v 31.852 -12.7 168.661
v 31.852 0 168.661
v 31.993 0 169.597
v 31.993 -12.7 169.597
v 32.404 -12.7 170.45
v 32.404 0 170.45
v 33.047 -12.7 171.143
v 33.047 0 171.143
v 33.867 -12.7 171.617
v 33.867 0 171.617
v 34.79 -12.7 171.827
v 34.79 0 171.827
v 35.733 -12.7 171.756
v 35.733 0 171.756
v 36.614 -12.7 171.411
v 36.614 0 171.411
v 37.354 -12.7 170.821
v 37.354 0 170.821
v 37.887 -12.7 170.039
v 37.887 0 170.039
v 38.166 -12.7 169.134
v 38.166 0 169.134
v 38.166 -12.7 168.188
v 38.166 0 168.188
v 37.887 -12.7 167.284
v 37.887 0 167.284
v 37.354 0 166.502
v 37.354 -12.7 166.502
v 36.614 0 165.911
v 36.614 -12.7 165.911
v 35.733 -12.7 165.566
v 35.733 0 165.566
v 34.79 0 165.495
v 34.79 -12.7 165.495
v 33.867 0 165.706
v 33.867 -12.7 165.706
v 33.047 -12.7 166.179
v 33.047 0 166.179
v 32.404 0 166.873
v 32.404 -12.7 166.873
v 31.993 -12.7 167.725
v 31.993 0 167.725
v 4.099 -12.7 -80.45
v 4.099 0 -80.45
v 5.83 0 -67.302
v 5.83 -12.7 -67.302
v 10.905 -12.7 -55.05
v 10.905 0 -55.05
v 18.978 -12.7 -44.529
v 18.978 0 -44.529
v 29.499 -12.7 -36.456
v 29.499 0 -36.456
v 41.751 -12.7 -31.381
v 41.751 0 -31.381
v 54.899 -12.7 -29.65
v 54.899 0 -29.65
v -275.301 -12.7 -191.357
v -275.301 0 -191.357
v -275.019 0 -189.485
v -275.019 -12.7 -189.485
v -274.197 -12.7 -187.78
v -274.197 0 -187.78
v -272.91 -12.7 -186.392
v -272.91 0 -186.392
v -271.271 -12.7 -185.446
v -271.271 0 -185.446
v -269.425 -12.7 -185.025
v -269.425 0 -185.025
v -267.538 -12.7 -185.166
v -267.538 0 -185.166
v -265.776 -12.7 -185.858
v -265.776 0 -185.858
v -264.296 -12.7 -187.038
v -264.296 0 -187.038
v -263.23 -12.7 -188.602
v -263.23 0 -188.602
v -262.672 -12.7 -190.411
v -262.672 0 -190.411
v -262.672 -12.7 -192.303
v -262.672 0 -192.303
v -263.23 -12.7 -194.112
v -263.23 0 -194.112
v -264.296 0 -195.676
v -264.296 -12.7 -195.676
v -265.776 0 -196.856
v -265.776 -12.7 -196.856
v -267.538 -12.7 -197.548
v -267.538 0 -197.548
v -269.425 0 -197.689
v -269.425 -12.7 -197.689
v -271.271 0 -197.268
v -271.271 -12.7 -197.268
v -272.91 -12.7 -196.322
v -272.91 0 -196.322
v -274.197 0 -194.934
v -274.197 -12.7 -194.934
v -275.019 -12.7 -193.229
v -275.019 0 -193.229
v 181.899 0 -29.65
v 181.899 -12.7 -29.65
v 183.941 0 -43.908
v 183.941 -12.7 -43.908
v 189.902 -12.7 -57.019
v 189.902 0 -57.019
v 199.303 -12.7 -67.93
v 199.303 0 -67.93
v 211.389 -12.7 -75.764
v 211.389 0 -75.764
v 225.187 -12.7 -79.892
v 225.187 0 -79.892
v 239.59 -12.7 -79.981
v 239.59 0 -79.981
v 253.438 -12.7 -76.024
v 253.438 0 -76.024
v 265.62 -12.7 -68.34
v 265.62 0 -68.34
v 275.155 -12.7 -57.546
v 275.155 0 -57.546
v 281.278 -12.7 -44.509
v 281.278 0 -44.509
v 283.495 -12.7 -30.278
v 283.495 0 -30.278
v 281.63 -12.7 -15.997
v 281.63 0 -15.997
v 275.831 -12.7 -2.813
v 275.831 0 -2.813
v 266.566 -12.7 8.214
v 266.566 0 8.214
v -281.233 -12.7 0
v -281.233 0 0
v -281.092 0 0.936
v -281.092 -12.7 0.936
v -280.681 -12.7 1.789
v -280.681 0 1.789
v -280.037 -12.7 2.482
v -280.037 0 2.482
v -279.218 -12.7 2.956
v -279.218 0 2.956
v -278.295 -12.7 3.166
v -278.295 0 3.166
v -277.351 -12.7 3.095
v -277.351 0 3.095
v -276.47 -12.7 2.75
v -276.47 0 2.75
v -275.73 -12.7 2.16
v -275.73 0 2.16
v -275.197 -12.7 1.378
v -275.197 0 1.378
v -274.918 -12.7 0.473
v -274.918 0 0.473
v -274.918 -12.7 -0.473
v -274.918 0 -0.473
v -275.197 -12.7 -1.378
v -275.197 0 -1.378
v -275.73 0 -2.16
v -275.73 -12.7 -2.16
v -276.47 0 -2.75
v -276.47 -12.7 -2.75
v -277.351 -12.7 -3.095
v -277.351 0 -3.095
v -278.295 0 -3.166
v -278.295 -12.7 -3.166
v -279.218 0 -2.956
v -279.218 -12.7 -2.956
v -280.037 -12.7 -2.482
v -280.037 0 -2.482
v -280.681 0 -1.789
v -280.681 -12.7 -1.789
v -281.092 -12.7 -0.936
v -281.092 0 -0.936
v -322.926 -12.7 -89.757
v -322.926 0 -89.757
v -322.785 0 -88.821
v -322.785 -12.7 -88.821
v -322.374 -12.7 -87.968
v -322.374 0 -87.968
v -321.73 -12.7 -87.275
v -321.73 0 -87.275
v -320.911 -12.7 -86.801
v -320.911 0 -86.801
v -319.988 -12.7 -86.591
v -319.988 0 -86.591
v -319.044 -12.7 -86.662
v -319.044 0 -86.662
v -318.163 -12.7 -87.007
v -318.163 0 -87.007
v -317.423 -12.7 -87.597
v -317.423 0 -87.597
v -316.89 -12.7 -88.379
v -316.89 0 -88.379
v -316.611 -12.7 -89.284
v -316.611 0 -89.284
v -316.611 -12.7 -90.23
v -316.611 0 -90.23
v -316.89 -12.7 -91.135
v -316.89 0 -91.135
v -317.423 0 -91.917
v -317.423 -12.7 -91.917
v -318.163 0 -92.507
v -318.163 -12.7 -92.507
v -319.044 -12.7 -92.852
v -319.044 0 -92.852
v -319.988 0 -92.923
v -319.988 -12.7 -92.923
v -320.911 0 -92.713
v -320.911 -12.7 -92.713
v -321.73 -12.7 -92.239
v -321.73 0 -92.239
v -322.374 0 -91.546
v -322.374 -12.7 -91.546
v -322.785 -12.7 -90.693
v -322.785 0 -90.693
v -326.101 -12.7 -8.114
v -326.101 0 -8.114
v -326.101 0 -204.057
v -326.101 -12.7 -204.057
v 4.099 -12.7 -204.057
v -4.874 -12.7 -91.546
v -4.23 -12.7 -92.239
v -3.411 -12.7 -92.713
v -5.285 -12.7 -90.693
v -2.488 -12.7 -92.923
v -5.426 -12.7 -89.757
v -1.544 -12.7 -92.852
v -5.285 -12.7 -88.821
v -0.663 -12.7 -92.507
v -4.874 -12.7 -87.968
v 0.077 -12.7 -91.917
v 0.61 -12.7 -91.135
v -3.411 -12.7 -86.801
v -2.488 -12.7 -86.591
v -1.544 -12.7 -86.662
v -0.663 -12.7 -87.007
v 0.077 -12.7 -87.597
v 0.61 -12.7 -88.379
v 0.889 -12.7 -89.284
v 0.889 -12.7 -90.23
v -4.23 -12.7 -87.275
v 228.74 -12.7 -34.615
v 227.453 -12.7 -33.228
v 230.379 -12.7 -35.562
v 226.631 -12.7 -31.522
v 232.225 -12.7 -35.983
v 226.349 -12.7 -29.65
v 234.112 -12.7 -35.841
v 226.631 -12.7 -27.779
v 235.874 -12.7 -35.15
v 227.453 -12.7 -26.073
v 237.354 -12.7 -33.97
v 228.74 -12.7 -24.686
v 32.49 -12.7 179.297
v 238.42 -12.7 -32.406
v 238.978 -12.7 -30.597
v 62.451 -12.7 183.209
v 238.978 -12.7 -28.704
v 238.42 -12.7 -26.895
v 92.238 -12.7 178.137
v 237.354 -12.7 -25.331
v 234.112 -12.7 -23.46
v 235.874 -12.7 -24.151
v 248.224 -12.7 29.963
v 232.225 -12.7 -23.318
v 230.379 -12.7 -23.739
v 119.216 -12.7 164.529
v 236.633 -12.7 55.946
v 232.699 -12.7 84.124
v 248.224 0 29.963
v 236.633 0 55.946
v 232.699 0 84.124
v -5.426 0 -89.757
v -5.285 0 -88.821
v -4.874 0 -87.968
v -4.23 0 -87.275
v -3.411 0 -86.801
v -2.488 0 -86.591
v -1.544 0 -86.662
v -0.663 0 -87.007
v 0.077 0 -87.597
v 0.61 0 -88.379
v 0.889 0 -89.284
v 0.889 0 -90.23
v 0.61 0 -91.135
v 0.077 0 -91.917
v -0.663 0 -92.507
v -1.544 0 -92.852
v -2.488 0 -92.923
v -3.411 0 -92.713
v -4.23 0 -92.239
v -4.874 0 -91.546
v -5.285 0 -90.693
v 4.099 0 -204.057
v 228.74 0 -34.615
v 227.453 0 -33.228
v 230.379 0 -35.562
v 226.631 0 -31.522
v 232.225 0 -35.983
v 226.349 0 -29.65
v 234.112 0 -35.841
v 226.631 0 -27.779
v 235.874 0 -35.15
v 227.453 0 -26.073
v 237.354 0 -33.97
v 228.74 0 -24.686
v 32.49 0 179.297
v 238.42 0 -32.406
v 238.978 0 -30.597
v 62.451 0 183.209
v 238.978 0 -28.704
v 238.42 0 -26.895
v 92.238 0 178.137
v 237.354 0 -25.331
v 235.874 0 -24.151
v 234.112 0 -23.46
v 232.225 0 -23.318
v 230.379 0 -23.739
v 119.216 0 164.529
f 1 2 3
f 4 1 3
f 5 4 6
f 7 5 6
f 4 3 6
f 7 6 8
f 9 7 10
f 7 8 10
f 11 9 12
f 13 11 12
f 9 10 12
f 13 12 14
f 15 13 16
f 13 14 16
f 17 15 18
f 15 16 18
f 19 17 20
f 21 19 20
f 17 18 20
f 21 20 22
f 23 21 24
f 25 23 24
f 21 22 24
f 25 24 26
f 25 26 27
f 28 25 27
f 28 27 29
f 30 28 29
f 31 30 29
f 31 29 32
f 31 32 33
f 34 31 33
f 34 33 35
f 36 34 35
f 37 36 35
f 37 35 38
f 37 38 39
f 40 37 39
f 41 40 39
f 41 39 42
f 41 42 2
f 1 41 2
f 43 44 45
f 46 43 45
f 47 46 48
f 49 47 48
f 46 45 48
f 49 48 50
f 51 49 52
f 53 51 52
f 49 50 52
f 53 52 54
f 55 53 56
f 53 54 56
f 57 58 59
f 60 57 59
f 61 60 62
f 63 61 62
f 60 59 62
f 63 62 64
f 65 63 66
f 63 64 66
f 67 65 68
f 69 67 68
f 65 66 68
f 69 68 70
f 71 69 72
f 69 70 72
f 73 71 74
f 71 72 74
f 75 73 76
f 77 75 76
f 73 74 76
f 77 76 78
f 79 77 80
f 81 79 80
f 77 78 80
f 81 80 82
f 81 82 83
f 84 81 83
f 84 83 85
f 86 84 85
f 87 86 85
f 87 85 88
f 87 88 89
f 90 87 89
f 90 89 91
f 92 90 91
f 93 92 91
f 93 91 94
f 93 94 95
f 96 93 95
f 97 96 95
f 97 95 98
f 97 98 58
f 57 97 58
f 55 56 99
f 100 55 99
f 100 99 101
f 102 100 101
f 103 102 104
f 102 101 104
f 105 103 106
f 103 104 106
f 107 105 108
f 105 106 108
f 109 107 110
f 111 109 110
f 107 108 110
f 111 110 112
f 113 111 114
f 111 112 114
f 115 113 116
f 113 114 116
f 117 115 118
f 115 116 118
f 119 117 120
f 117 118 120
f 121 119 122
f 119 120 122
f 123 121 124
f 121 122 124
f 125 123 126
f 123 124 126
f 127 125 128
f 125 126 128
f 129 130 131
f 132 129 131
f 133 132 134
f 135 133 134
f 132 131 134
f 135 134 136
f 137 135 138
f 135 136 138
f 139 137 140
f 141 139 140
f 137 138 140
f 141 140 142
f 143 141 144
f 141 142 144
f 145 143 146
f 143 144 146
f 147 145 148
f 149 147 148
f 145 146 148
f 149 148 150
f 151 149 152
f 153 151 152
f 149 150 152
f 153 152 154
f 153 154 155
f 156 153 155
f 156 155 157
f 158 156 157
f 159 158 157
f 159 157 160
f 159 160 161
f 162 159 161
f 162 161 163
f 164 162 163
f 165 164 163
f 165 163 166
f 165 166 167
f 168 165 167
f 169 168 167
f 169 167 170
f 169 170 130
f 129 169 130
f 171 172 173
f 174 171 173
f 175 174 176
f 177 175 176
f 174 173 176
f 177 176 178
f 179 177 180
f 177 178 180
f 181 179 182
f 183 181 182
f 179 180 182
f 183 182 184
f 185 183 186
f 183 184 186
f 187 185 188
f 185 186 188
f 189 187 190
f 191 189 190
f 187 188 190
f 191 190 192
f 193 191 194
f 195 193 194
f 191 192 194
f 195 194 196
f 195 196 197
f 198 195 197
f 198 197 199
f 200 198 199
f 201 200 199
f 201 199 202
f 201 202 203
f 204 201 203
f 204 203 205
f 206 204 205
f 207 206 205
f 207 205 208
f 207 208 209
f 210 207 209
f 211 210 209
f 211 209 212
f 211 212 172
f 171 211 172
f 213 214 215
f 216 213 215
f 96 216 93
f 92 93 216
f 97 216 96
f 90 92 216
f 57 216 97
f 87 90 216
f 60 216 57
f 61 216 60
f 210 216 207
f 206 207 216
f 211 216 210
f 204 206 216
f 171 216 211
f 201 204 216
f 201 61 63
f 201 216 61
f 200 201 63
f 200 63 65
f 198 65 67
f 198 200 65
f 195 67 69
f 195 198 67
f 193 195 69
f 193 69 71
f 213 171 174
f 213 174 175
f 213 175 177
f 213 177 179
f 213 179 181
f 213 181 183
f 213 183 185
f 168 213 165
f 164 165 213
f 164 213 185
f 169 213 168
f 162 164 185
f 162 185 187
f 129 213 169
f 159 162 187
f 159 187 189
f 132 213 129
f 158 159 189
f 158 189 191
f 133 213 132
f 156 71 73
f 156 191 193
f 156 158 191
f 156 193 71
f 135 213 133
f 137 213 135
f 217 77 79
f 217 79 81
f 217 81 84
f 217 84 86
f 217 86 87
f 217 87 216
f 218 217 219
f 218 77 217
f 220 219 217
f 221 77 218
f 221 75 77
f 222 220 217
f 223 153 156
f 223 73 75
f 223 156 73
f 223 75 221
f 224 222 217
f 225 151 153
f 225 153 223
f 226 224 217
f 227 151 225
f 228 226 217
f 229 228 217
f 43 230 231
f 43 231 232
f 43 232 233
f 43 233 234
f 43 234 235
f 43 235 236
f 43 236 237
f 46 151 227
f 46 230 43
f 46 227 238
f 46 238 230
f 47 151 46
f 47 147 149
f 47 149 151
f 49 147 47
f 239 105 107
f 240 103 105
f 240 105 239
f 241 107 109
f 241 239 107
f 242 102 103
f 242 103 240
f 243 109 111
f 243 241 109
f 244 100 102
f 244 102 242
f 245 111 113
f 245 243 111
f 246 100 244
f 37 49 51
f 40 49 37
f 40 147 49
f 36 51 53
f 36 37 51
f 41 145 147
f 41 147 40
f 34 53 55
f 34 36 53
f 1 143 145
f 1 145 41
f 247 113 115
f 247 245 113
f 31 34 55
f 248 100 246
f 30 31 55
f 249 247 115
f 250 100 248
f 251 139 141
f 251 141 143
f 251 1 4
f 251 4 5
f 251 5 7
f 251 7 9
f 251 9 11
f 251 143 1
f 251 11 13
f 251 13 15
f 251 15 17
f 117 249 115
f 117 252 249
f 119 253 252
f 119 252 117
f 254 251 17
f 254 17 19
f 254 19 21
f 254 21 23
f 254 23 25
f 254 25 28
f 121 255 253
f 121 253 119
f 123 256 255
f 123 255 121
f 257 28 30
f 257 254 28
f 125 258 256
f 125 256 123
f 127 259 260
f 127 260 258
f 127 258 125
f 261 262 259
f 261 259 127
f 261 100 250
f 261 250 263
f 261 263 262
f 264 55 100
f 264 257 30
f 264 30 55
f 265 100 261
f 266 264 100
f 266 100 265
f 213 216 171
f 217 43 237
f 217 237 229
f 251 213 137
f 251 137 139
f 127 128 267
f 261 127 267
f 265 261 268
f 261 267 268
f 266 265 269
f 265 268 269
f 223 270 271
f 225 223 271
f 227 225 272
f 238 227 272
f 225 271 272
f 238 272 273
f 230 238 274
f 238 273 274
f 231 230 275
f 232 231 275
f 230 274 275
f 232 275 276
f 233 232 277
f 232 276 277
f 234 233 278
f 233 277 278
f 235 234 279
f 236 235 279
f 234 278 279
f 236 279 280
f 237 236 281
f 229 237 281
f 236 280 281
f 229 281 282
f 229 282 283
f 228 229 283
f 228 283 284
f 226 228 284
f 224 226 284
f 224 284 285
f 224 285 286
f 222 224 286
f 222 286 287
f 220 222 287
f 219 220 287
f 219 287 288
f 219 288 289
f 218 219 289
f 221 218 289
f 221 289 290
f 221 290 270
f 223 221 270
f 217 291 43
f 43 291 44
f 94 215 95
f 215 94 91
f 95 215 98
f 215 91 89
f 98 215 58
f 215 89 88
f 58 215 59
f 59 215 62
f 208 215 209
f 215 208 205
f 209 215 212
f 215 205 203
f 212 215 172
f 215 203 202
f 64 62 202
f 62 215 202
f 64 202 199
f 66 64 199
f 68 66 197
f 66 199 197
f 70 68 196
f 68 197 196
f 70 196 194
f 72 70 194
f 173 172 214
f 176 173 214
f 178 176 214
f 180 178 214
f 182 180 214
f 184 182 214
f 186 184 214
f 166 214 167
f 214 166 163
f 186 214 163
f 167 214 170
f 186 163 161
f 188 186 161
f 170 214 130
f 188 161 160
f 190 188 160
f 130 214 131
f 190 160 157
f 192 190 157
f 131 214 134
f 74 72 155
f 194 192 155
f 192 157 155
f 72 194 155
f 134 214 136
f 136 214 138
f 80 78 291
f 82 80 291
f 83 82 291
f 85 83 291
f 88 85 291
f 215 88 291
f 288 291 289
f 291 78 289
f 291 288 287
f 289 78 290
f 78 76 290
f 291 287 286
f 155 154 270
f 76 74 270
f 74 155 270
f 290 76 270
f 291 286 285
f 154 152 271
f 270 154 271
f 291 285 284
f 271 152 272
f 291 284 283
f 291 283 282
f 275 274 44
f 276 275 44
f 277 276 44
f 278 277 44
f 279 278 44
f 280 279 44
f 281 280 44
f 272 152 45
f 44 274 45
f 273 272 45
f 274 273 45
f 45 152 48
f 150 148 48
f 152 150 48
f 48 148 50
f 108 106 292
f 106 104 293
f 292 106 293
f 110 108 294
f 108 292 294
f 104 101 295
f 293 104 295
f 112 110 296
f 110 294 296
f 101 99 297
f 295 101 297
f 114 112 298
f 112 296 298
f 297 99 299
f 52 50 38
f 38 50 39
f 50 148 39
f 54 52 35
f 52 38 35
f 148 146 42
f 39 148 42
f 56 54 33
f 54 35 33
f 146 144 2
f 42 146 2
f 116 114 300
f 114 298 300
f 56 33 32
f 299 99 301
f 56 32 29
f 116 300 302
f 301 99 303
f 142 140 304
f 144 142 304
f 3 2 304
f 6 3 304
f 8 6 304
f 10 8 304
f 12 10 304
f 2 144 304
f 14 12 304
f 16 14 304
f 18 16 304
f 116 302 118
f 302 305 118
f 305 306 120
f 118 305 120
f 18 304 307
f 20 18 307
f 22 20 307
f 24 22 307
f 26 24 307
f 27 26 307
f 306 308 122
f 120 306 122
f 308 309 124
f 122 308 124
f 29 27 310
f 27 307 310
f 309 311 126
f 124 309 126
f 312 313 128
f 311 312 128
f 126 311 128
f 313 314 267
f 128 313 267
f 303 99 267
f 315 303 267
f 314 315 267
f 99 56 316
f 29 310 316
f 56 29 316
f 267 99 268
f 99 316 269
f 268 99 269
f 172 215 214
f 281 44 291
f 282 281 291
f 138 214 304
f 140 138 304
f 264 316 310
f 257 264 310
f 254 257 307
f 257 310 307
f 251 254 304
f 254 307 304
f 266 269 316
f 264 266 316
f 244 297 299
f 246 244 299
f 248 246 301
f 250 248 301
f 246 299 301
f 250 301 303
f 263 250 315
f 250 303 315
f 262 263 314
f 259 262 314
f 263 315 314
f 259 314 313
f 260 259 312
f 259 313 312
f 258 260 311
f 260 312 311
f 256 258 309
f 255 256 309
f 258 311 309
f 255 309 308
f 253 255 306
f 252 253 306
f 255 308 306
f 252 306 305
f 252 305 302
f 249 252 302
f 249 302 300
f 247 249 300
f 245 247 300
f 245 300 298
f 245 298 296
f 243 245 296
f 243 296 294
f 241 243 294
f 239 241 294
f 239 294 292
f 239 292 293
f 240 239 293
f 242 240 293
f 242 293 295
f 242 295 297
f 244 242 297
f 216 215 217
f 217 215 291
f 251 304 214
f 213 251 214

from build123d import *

# Parameters (mm, degrees)
F1_DEPTH = 12.7
F3_D     = 12.7
F5_D     = 6.35
F7_D     = 6.35
F9_D     = 6.35
F11_D    = 6.35


with BuildPart() as f1:
    # F0 (on Front) → F1 (new body)
    with BuildSketch(Plane.XZ):
        with BuildLine():
            Line((-326.100796, -8.113854), (-326.100796, -204.056984))
            Line((-326.100796, -204.056984), (4.099204, -204.056984))
            Line((4.099204, -204.056984), (4.099204, -80.450462))
            ThreePointArc((4.099204, -80.450462), (18.97818, -44.529437), (54.899204, -29.650462))
            Line((54.899204, -29.650462), (181.899204, -29.650462))
            ThreePointArc((181.899204, -29.650462), (253.438217, -76.024305), (266.565871, 8.213623))
            ThreePointArc((266.565871, 8.213623), (241.514438, 42.546778), (232.699367, 84.123628))
            Line((232.699367, 84.123628), (119.216243, 164.528722))
            ThreePointArc((119.216243, 164.528722), (77.53434, 181.786259), (32.489865, 179.296508))
            Line((32.489865, 179.296508), (-326.100796, -8.113854))
        make_face()
    extrude(amount=F1_DEPTH)

    # F3 (through all)
    with Locations(Plane.XZ.offset(12.7)):
        with Locations((232.699204, -29.650462), (-268.950796, -191.356984)):
            Hole(F3_D / 2)

    # F5 (through all)
    with Locations(Plane.XZ.offset(12.7)):
        with Locations((-319.750796, -89.756984)):
            Hole(F5_D / 2)

    # F7 (through all)
    with Locations(Plane.XZ.offset(12.7)):
        with Locations((-2.250796, -89.756984)):
            Hole(F7_D / 2)

    # F9 (through all)
    with Locations(Plane.XZ.offset(12.7)):
        with Locations((35.026812, 168.661091)):
            Hole(F9_D / 2)

    # F11 (through all)
    with Locations(Plane.XZ.offset(12.7)):
        with Locations((-278.057724, 0)):
            Hole(F11_D / 2)


solid = f1.part
